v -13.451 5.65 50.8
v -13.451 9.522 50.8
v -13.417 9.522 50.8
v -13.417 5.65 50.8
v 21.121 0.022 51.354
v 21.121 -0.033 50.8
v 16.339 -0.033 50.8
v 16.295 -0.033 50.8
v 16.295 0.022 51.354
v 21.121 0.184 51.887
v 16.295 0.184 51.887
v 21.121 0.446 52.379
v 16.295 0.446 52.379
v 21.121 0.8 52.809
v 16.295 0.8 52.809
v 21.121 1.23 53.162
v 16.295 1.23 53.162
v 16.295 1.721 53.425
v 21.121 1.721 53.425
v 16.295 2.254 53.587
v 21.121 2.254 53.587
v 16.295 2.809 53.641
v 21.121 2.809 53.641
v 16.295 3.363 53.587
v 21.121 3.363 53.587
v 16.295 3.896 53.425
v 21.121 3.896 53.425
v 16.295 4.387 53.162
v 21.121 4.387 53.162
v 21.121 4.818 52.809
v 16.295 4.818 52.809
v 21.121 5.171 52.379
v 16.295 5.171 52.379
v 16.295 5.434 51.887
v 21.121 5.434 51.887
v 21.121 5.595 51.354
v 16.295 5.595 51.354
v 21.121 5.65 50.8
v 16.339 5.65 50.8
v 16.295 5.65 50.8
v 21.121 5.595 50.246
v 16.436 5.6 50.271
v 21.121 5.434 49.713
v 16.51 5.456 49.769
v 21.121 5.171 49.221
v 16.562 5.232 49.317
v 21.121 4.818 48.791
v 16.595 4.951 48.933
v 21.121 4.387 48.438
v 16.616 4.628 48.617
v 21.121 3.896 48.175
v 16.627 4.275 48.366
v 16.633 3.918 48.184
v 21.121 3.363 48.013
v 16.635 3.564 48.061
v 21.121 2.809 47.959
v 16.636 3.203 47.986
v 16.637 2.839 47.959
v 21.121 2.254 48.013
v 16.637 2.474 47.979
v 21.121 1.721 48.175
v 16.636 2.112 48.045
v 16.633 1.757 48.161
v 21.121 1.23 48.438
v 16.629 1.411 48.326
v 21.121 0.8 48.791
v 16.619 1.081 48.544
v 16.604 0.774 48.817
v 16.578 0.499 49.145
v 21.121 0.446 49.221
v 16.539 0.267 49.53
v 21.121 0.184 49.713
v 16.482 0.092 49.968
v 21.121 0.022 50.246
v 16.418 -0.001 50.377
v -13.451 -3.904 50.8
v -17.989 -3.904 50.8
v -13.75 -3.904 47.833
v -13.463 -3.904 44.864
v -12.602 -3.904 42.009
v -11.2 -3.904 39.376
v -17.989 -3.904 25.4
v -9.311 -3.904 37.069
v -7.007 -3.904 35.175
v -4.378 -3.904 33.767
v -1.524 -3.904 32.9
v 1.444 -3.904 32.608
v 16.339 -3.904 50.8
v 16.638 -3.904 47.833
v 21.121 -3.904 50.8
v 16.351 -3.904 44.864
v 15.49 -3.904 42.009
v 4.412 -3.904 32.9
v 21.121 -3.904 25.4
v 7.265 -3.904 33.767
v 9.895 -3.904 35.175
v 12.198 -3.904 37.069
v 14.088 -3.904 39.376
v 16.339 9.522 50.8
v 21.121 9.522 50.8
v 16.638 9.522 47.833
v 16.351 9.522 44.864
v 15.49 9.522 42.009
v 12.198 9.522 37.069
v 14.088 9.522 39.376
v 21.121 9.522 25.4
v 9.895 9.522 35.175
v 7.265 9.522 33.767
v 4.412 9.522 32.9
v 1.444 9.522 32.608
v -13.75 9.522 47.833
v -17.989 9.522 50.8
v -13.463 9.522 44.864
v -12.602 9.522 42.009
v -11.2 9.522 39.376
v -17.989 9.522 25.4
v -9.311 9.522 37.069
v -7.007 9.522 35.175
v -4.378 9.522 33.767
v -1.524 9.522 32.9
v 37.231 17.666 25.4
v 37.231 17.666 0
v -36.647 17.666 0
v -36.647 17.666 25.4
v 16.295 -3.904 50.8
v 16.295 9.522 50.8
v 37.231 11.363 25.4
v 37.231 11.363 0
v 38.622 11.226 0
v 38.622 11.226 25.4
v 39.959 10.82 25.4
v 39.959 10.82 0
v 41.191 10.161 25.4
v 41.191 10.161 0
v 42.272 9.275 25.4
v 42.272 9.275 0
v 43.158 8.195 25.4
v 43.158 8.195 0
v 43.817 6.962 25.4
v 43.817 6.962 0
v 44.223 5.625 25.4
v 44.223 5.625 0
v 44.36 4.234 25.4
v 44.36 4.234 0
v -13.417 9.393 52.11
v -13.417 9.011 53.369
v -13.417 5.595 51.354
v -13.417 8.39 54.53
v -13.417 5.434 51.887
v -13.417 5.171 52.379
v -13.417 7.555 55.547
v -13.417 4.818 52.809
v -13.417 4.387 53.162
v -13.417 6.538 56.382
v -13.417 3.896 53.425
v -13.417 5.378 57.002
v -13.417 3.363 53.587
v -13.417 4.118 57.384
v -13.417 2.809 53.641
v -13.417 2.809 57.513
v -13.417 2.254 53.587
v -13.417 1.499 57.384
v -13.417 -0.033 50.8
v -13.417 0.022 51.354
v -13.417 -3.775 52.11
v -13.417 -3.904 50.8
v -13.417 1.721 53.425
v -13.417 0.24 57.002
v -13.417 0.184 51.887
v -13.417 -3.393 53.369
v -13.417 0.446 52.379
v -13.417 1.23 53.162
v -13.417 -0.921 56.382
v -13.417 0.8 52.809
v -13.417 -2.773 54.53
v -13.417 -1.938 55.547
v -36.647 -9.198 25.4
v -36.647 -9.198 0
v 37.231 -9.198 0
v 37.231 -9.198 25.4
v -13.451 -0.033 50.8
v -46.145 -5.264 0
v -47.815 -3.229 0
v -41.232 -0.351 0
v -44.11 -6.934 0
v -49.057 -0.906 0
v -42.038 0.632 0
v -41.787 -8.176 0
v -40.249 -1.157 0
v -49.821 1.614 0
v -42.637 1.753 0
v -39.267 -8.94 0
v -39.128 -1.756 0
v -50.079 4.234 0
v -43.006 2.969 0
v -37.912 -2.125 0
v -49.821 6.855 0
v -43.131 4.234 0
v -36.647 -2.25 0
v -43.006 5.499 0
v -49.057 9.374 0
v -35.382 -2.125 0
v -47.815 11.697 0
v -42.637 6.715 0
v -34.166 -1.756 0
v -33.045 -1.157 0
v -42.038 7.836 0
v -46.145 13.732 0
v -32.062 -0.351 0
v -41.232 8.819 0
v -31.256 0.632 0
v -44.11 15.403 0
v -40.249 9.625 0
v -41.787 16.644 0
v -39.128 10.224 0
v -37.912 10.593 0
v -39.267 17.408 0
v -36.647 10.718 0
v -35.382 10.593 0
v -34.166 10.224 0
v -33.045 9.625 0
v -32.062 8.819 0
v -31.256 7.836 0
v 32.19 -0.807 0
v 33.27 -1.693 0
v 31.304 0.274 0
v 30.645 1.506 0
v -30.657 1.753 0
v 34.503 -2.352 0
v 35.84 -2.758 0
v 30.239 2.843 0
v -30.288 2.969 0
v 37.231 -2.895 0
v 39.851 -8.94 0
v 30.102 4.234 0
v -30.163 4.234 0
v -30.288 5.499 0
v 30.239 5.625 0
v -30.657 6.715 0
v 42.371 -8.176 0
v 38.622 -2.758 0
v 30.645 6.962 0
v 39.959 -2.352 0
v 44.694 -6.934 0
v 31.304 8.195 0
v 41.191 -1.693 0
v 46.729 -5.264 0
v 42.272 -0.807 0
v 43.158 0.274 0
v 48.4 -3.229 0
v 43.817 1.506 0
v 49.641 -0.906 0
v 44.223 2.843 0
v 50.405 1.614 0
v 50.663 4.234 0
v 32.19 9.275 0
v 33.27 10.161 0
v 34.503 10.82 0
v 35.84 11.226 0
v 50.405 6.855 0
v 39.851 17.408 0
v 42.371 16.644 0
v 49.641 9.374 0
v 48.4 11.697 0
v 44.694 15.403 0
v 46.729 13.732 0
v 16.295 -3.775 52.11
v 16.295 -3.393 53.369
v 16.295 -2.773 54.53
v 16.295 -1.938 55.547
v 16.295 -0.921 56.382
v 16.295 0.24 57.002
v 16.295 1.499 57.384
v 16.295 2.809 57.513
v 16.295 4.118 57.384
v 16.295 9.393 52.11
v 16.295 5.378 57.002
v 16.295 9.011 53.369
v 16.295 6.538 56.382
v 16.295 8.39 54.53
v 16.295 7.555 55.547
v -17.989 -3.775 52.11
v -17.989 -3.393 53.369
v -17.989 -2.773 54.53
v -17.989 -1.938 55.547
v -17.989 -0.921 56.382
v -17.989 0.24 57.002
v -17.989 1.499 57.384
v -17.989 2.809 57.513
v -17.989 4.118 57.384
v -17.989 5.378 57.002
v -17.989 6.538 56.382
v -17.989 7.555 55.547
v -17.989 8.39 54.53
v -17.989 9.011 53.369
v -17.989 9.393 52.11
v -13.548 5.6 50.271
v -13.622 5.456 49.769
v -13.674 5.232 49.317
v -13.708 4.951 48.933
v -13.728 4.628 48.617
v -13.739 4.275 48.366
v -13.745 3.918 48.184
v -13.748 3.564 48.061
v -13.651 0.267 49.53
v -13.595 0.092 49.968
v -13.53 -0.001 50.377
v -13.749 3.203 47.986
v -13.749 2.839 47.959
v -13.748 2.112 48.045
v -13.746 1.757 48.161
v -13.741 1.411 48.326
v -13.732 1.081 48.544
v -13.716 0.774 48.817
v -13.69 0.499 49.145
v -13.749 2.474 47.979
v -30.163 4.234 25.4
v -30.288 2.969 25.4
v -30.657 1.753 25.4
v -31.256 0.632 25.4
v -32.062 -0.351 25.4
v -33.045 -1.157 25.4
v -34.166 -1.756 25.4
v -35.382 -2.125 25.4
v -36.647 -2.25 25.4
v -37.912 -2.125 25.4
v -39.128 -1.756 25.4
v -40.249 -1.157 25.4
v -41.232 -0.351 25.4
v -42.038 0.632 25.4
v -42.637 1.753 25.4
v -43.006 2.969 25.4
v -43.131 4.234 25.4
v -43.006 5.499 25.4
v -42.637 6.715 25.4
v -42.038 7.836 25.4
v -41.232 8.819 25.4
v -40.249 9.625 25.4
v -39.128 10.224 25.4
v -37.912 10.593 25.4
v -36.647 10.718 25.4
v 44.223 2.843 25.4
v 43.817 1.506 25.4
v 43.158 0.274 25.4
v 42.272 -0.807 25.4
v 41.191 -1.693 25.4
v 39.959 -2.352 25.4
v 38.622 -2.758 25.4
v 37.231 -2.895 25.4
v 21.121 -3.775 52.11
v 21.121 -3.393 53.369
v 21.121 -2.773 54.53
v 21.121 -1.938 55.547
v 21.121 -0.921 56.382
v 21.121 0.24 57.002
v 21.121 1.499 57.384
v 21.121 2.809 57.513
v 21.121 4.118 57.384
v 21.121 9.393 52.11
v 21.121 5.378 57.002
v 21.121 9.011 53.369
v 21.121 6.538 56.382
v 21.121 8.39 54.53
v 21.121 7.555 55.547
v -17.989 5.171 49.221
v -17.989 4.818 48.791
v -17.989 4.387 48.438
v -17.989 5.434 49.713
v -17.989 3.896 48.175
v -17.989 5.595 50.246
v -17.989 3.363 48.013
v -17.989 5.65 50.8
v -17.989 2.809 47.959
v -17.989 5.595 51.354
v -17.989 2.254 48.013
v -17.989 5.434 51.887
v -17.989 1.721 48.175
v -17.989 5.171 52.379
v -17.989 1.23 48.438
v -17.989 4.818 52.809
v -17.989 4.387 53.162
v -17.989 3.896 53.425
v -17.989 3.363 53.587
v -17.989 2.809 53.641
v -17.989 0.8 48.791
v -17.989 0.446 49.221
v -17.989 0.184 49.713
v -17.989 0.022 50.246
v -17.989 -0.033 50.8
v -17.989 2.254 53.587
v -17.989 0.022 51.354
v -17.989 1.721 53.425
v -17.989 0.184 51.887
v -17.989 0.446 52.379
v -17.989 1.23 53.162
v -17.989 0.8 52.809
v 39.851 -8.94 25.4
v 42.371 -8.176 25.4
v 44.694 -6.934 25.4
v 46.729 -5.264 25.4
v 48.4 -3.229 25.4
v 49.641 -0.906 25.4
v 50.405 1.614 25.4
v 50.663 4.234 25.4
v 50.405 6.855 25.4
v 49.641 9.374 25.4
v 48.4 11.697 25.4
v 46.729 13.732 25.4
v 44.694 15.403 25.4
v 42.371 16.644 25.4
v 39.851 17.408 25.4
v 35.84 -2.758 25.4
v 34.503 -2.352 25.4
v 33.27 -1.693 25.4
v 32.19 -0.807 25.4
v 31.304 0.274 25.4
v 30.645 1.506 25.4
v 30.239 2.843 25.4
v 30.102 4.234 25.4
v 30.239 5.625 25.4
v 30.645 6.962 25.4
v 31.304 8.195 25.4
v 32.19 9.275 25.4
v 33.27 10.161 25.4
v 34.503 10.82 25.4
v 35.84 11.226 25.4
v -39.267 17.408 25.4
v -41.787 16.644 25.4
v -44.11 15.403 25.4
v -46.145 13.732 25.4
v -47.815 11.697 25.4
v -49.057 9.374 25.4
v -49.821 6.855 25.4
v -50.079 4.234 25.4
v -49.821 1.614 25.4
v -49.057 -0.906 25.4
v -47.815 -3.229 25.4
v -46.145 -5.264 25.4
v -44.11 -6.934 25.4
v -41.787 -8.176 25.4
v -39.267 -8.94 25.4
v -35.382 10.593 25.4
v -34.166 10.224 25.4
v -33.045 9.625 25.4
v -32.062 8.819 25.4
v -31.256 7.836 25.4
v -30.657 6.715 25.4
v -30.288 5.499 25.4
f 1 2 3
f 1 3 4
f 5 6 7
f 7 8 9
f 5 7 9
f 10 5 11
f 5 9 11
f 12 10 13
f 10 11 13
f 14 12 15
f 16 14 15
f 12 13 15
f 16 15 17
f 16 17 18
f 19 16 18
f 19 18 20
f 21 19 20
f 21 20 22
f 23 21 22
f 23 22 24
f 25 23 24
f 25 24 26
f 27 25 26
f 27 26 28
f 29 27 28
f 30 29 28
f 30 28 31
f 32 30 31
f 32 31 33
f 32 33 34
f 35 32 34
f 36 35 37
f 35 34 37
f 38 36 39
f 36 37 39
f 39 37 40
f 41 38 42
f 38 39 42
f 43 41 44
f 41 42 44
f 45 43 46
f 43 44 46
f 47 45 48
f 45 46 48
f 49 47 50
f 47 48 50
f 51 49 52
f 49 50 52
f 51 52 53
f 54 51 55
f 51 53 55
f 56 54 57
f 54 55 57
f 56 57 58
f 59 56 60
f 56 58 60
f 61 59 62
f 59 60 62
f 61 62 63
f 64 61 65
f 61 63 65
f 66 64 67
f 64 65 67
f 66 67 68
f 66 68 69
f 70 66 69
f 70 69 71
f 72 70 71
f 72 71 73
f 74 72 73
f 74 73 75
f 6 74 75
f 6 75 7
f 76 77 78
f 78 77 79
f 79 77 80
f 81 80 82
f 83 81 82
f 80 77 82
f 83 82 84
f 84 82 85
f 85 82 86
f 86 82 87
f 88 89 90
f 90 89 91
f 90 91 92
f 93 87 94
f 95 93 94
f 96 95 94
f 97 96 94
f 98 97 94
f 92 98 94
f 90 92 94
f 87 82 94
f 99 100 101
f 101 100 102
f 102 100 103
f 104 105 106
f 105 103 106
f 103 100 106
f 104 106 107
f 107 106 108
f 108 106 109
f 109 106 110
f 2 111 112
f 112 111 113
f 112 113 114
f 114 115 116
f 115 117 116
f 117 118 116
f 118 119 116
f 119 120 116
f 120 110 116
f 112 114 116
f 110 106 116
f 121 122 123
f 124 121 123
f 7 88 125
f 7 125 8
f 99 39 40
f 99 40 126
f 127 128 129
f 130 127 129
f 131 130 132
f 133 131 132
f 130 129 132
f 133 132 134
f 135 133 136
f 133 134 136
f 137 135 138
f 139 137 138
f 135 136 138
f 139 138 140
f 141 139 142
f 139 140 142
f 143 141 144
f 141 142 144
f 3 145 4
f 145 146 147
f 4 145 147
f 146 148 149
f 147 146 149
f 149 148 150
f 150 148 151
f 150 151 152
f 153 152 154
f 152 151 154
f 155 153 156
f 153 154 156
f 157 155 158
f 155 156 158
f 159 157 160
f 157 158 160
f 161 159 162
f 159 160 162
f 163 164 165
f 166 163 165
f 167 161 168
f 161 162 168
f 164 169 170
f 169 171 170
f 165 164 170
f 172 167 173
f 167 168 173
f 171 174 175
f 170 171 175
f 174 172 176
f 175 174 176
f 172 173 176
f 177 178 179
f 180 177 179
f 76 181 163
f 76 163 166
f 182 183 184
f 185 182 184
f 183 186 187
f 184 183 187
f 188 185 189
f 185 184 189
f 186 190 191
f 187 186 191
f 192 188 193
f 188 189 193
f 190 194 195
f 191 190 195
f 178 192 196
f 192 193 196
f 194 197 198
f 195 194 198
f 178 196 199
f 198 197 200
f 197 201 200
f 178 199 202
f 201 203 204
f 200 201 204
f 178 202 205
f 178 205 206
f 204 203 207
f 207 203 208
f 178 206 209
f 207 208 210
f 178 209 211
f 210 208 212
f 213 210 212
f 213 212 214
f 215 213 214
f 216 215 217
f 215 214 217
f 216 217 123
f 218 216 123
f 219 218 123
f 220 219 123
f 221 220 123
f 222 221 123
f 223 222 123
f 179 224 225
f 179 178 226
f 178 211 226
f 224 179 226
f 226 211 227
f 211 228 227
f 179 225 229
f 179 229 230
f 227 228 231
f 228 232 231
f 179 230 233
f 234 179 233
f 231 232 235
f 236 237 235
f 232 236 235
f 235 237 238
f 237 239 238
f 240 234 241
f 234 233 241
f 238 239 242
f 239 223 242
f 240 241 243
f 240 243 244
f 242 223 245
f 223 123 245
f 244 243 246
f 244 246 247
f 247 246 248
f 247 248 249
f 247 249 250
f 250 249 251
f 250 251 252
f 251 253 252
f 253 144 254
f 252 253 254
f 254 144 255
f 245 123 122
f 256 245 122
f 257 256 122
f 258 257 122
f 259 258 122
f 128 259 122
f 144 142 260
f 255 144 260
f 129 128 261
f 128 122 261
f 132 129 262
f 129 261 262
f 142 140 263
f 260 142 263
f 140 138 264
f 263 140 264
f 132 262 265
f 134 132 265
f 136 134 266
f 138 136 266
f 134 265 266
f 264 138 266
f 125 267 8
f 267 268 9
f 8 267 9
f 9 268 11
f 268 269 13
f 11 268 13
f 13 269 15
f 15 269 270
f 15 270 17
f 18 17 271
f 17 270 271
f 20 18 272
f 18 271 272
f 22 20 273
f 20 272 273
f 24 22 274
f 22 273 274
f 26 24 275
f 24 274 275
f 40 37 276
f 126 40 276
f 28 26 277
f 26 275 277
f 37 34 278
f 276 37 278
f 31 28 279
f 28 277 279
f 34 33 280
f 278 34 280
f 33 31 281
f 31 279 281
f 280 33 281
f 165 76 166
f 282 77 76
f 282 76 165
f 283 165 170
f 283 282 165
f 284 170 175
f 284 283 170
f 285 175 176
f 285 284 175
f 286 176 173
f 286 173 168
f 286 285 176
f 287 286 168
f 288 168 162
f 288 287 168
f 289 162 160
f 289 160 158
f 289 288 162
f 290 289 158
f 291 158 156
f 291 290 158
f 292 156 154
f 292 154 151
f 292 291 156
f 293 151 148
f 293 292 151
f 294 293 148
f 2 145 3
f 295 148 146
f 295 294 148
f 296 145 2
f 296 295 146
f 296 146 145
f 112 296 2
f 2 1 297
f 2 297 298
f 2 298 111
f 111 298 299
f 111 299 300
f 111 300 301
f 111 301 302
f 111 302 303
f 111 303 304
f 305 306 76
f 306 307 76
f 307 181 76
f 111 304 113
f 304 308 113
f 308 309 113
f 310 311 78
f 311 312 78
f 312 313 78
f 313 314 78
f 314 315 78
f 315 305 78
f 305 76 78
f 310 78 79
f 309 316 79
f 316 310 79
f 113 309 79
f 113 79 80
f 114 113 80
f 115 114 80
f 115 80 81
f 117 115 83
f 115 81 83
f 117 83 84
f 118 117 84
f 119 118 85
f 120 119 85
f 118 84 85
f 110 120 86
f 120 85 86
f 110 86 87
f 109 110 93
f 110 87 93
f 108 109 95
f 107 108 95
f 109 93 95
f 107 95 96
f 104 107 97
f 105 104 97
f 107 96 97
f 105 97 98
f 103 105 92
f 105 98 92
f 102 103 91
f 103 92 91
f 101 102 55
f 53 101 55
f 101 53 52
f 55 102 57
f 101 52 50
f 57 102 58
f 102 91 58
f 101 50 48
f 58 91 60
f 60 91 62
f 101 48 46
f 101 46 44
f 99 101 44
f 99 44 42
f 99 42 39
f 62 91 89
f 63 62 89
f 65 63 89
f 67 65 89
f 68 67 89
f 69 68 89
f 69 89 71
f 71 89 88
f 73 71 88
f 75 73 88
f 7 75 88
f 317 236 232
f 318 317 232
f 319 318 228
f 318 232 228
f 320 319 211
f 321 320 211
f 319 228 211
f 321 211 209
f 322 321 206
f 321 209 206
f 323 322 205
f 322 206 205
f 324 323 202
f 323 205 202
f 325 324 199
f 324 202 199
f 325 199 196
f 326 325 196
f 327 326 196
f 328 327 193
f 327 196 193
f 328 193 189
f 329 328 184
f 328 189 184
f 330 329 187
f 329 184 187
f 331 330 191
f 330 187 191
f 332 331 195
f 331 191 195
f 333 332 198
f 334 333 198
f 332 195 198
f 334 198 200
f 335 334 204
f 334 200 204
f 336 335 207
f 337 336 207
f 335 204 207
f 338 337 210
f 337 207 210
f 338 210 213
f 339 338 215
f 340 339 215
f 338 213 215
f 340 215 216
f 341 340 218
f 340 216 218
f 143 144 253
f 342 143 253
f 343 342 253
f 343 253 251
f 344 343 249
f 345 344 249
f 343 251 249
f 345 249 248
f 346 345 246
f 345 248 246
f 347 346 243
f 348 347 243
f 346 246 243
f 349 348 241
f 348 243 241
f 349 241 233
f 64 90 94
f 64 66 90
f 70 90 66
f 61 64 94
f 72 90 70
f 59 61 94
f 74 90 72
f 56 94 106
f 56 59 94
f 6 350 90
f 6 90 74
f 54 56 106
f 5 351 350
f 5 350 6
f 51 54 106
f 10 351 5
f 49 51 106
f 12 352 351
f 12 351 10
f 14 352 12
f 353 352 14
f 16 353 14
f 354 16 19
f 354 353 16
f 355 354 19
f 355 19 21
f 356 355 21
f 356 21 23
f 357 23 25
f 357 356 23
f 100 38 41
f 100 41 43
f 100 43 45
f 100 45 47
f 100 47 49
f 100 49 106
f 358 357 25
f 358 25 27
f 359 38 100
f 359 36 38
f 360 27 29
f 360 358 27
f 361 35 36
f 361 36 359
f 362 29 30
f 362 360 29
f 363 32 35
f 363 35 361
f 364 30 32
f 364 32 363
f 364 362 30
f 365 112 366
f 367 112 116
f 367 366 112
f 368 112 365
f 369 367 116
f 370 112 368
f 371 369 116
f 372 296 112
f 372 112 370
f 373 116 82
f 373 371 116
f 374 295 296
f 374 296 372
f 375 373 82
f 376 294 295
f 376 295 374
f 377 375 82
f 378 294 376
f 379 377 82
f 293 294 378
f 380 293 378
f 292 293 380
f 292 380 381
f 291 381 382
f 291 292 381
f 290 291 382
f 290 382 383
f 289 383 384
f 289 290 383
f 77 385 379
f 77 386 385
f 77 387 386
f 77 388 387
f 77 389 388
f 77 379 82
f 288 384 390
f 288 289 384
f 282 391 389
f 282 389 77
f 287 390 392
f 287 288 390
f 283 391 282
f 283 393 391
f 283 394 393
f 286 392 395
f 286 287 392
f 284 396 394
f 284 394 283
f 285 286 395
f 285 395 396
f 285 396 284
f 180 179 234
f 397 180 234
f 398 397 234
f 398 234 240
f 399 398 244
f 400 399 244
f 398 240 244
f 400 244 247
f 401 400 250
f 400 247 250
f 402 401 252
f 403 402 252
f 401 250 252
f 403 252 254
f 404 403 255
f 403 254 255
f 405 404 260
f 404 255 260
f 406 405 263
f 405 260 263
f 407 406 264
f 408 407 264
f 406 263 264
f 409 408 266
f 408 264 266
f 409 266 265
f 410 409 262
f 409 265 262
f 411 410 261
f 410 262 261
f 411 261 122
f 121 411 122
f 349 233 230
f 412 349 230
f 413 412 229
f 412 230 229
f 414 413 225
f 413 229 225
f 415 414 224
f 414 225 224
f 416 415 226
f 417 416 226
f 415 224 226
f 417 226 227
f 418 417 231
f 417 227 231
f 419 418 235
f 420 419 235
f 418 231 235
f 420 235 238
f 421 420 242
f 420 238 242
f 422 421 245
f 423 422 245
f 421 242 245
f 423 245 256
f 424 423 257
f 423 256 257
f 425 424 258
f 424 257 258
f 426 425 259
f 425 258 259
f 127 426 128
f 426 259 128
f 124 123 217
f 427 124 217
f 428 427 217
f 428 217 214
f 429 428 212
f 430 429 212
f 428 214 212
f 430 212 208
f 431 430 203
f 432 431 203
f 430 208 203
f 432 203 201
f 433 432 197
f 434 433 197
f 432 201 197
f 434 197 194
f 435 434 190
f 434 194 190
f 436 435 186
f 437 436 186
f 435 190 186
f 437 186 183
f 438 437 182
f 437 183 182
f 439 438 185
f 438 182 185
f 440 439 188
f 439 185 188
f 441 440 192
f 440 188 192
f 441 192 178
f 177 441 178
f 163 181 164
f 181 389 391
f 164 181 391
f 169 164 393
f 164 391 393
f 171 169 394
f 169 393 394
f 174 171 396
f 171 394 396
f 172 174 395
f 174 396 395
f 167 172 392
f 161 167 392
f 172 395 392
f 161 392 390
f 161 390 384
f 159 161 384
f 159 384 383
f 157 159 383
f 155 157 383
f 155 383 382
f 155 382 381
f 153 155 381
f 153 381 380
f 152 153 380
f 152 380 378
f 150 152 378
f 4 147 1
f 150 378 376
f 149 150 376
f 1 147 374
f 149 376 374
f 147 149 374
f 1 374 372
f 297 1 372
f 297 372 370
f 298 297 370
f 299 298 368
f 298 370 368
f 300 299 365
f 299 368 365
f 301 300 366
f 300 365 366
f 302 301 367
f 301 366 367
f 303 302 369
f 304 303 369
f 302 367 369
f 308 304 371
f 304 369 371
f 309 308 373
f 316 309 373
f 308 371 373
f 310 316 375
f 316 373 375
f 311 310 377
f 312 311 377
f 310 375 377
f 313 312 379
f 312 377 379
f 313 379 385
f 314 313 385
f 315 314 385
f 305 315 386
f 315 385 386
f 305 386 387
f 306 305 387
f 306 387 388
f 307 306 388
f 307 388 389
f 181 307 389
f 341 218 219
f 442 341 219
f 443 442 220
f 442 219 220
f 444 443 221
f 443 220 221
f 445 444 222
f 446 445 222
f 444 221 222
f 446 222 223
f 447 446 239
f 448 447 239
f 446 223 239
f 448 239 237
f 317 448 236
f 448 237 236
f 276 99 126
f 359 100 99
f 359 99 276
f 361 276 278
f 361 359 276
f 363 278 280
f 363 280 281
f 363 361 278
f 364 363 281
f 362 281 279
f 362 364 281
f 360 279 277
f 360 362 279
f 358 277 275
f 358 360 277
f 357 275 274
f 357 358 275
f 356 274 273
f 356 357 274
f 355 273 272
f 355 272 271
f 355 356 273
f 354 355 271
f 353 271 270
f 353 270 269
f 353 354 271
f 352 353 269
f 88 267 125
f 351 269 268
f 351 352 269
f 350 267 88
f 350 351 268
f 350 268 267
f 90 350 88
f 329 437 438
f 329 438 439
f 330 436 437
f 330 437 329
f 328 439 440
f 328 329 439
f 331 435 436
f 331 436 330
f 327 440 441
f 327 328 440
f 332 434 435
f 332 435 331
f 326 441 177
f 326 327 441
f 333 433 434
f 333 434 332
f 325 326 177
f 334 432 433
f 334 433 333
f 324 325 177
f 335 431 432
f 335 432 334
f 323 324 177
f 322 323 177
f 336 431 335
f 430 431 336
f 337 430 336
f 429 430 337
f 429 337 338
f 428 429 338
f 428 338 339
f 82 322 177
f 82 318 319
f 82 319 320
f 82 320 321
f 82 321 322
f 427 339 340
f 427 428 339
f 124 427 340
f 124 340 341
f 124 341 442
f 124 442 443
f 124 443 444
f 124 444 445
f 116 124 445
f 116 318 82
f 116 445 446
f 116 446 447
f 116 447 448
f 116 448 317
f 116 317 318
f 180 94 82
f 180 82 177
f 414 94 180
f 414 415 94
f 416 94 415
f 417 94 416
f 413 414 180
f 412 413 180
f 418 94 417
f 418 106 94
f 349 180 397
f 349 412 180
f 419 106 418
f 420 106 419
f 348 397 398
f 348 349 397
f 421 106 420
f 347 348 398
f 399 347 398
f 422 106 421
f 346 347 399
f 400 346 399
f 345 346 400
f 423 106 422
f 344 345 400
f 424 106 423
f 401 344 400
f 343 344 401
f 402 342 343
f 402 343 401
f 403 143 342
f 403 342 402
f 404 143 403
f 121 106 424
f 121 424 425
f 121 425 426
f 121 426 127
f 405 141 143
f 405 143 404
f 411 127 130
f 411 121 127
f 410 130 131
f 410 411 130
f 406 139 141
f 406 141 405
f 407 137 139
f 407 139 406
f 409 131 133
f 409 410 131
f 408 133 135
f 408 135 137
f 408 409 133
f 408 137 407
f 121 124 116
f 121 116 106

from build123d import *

# Parameters (mm, degrees)
F1_DEPTH  = 25.4
F2_DEPTH  = 50.8
F5_DEPTH  = 25.4
F6_DEPTH  = 4.572
F8_DEPTH  = 4.826
F9_R      = 2.841234
F10_DEPTH = 49.784


with BuildPart() as f1:
    # F0 (on Top) → F1 (new body)
    with BuildSketch(Plane.XY):
        with BuildLine():
            Line((-36.646917, 10.717721), (-36.646917, 17.666442))
            ThreePointArc((-36.646917, 17.666442), (-50.079254, 4.234106), (-36.646917, -9.19823))
            Line((-36.646917, -9.19823), (-36.646917, -2.249508))
            ThreePointArc((-36.646917, -2.249508), (-43.130532, 4.234106), (-36.646917, 10.717721))
        make_face()
        with BuildLine():
            Line((37.230935, 17.666442), (-36.646917, 17.666442))
            Line((-36.646917, 17.666442), (-36.646917, 10.717721))
            ThreePointArc((-36.646917, 10.717721), (-32.06231, 8.818714), (-30.163303, 4.234106))
            ThreePointArc((-30.163303, 4.234106), (-32.06231, -0.350501), (-36.646917, -2.249508))
            Line((-36.646917, -2.249508), (-36.646917, -9.19823))
            Line((-36.646917, -9.19823), (37.230935, -9.19823))
            Line((37.230935, -9.19823), (37.230935, -2.894706))
            ThreePointArc((37.230935, -2.894706), (30.102123, 4.234106), (37.230935, 11.362918))
            Line((37.230935, 11.362918), (37.230935, 17.666442))
        make_face()
        Polygon((-17.989082, 0), (-17.989082, 9.521575), (21.121064, 9.521575), (21.121064, 0), (21.121064, -3.904298), (-17.989082, -3.904298), align=None, mode=Mode.SUBTRACT)
        with BuildLine():
            ThreePointArc((37.230935, -9.19823), (50.663271, 4.234106), (37.230935, 17.666442))
            Line((37.230935, 17.666442), (37.230935, 11.362918))
            ThreePointArc((37.230935, 11.362918), (42.271766, 9.274937), (44.359747, 4.234106))
            ThreePointArc((44.359747, 4.234106), (42.271766, -0.806725), (37.230935, -2.894706))
            Line((37.230935, -2.894706), (37.230935, -9.19823))
        make_face()
    extrude(amount=F1_DEPTH)

    # F0 (on Top) → F2 (join)
    with BuildSketch(Plane.XY):
        Polygon((21.121064, 9.521575), (-17.989082, 9.521575), (-17.989082, 0), (-17.989082, -3.904298), (21.121064, -3.904298), (21.121064, 0), align=None)
    extrude(amount=F2_DEPTH)

    # F4 (on face) → F5 (cut)
    with BuildSketch(Plane.XZ.offset(3.904298)):
        with BuildLine():
            Line((16.338727, 50.8), (-13.450965, 50.8))
            ThreePointArc((-13.450965, 50.8), (1.443881, 32.607662), (16.338727, 50.8))
        make_face()
    extrude(amount=-F5_DEPTH, mode=Mode.SUBTRACT)

    # F3 (on face) → F6 (join)
    with BuildSketch(Plane(origin=(-17.989082, 0, 0), x_dir=(0, -1, 0), z_dir=(-1, 0, 0))):
        with BuildLine():
            Line((-9.521575, 50.8), (3.904298, 50.8))
            ThreePointArc((3.904298, 50.8), (-2.808638, 57.512936), (-9.521575, 50.8))
        make_face()
    extrude(amount=-F6_DEPTH)

    # F7 (on face) → F8 (join)
    with BuildSketch(Plane.YZ.offset(21.121064)):
        with BuildLine():
            Line((-3.904298, 50.8), (9.521575, 50.8))
            ThreePointArc((9.521575, 50.8), (2.808638, 57.512936), (-3.904298, 50.8))
        make_face()
    extrude(amount=-F8_DEPTH)

    # F9 (on face) → F10 (cut)
    with BuildSketch(Plane(origin=(-17.989082, 0, 0), x_dir=(0, -1, 0), z_dir=(-1, 0, 0))):
        with Locations((-2.808638, 50.8)):
            Circle(F9_R)
    extrude(amount=-F10_DEPTH, mode=Mode.SUBTRACT)


solid = f1.part
